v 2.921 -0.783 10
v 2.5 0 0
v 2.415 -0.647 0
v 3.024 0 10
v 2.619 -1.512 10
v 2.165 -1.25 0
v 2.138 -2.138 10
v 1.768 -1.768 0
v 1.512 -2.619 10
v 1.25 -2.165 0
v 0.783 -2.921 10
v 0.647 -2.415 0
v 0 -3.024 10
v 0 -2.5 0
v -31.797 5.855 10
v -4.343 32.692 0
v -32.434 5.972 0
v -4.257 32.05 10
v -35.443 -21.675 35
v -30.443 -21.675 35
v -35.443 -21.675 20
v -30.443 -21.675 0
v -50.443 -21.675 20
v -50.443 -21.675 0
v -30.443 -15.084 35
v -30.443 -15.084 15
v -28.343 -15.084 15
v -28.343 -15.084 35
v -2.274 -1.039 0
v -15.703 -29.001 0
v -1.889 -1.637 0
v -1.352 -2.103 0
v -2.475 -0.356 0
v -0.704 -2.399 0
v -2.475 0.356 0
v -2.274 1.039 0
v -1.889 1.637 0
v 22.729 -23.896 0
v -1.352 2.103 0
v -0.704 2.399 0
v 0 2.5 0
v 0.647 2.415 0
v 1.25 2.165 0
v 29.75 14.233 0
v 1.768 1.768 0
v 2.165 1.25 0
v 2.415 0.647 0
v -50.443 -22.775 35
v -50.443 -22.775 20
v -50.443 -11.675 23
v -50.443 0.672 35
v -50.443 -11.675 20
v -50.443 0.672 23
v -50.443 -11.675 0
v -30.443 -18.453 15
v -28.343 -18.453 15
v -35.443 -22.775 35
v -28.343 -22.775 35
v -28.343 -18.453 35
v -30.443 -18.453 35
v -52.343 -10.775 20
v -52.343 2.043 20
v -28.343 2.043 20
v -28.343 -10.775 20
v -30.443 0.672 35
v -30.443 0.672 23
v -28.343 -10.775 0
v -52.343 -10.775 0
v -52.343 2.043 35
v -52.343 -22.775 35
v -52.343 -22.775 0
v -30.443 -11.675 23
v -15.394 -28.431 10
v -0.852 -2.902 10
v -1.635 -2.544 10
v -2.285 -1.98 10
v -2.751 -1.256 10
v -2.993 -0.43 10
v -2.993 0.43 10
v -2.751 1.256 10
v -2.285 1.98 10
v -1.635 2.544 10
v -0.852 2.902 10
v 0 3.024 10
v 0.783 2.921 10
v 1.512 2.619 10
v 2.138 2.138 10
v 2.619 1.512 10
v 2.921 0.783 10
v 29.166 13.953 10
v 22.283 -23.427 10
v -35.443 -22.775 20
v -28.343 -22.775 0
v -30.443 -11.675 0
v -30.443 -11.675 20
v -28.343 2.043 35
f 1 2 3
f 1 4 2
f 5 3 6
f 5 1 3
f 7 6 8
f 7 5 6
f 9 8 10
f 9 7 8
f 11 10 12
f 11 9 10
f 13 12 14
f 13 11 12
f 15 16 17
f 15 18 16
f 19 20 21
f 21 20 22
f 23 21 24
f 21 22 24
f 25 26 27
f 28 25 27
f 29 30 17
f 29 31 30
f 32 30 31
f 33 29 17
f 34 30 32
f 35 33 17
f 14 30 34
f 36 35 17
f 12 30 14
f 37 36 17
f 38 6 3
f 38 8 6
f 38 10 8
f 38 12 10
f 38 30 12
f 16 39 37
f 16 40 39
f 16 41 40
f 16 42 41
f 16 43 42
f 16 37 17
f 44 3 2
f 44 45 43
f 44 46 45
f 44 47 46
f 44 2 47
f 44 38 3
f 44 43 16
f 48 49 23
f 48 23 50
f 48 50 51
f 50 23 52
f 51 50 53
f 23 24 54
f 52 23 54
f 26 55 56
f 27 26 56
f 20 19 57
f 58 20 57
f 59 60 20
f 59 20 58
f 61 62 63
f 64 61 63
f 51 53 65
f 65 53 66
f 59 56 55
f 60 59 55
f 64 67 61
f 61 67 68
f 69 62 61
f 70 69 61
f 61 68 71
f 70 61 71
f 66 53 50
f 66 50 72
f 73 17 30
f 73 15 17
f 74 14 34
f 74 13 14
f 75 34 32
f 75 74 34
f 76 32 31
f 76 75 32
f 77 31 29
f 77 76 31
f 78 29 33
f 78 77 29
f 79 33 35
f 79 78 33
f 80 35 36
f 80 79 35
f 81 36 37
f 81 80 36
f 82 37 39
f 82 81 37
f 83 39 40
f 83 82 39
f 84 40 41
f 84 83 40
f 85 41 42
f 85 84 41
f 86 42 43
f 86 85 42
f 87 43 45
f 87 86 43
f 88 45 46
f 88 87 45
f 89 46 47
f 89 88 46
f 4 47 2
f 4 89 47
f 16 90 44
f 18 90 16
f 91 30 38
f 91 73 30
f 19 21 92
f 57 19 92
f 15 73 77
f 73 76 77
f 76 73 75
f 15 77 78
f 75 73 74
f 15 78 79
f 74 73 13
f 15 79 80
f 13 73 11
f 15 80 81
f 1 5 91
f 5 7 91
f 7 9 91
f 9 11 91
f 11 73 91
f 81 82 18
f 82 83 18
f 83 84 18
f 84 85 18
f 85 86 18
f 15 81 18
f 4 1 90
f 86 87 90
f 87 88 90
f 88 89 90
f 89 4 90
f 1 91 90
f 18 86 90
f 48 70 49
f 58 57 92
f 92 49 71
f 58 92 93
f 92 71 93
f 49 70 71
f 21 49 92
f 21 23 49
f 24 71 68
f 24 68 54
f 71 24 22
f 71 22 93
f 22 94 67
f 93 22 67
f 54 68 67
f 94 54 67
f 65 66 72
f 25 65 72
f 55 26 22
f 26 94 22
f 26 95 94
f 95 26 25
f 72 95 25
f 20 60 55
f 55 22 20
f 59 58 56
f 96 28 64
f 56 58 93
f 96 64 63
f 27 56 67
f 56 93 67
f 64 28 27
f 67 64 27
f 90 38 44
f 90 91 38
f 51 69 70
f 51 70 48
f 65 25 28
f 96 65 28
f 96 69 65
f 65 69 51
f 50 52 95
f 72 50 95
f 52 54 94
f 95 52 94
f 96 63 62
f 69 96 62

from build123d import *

# Parameters (mm, degrees)
F0_W     = 24
F0_H     = 12
F0_W_2   = 20
F0_H_2   = 10
F1_DEPTH = 15
F3_DEPTH = 5
F4_W     = 20
F4_H     = 0.9004633875
F5_DEPTH = 3
F6_DEPTH = 15
F8_DEPTH = 10
F8_TAPER = 3


with BuildPart() as f1:
    # F0 (on Top) → F1 (new body)
    with BuildSketch(Plane.XY):
        with Locations((-40.3433722556, -16.7747783065)):
            Rectangle(F0_W, F0_H)
        with Locations((-40.4425580055, -16.675241694)):
            Rectangle(F0_W_2, F0_H_2, mode=Mode.SUBTRACT)
    extrude(amount=F1_DEPTH)

    # F2 (on face) → F3 (join)
    with BuildSketch(Plane.XY.offset(15)):
        Polygon((-30.4425580055, -18.45254004), (-30.4425580055, -21.675241694), (-50.4425580055, -21.675241694), (-50.4425580055, -11.675241694), (-30.4425580055, -11.675241694), (-30.4425580055, -15.0842843577), (-28.3433722556, -15.0842843577), (-28.3433722556, -10.7747783065), (-52.3433722556, -10.7747783065), (-52.3433722556, -22.7747783065), (-28.3433722556, -22.7747783065), (-28.3433722556, -18.45254004), align=None)
    extrude(amount=F3_DEPTH)

    # F4 (on face) → F5 (join)
    with BuildSketch(Plane.XY.offset(20)):
        Polygon((-30.4425580055, 0.6715257093), (-50.4425580055, 0.6715257093), (-50.4425580055, -9.3284742907), (-50.4425580055, -10.7747783065), (-30.4425580055, -10.7747783065), (-30.4425580055, -9.3284742907), align=None)
        with Locations((-40.4425580055, -11.2250100002)):
            Rectangle(F4_W, F4_H)
        Polygon((-50.4425580055, -11.675241694), (-50.4425580055, -10.7747783065), (-52.3433722556, -10.7747783065), (-52.3433722556, -22.7747783065), (-50.4425580055, -22.7747783065), (-50.4425580055, -21.675241694), align=None)
        Polygon((-50.4425580055, -9.3284742907), (-50.4425580055, 0.6715257093), (-30.4425580055, 0.6715257093), (-30.4425580055, -9.3284742907), (-30.4425580055, -10.7747783065), (-28.3433722556, -10.7747783065), (-28.3433722556, 2.0432167221), (-52.3433722556, 2.0432167221), (-52.3433722556, -10.7747783065), (-50.4425580055, -10.7747783065), align=None)
        Polygon((-28.3433722556, -10.7747783065), (-30.4425580055, -10.7747783065), (-30.4425580055, -11.675241694), (-30.4425580055, -15.0842843577), (-28.3433722556, -15.0842843577), align=None)
    extrude(amount=F5_DEPTH)

    # F4 (on face) → F6 (join)
    with BuildSketch(Plane.XY.offset(20)):
        Polygon((-50.4425580055, -9.3284742907), (-50.4425580055, 0.6715257093), (-30.4425580055, 0.6715257093), (-30.4425580055, -9.3284742907), (-30.4425580055, -10.7747783065), (-30.4425580055, -11.675241694), (-30.4425580055, -15.0842843577), (-28.3433722556, -15.0842843577), (-28.3433722556, -10.7747783065), (-28.3433722556, 2.0432167221), (-52.3433722556, 2.0432167221), (-52.3433722556, -10.7747783065), (-52.3433722556, -22.7747783065), (-50.4425580055, -22.7747783065), (-50.4425580055, -21.675241694), (-50.4425580055, -11.675241694), (-50.4425580055, -10.7747783065), align=None)
        Polygon((-35.4425580055, -22.7747783065), (-28.3433722556, -22.7747783065), (-28.3433722556, -21.675241694), (-28.3433722556, -18.45254004), (-30.4425580055, -18.45254004), (-30.4425580055, -21.675241694), (-35.4425580055, -21.675241694), align=None)
    extrude(amount=F6_DEPTH)


with BuildPart() as f8:
    # F7 (on Top) → F8 (new body)
    with BuildSketch(Plane.XY):
        Polygon((-15.7026917916, -29.0010523291), (22.729241176, -23.8959653762), (29.7501353768, 14.2325335326), (-4.3426463432, 32.6921548454), (-32.434038418, 5.9723293273), align=None)
        with BuildLine():
            ThreePointArc((0, 2.5), (1.767766953, 1.767766953), (2.5, 0))
            ThreePointArc((2.5, 0), (1.767766953, -1.767766953), (0, -2.5))
            ThreePointArc((0, -2.5), (-2.5, 0), (0, 2.5))
        make_face(mode=Mode.SUBTRACT)
    extrude(amount=F8_DEPTH, taper=F8_TAPER)


solid = Compound([f1.part, f8.part])
